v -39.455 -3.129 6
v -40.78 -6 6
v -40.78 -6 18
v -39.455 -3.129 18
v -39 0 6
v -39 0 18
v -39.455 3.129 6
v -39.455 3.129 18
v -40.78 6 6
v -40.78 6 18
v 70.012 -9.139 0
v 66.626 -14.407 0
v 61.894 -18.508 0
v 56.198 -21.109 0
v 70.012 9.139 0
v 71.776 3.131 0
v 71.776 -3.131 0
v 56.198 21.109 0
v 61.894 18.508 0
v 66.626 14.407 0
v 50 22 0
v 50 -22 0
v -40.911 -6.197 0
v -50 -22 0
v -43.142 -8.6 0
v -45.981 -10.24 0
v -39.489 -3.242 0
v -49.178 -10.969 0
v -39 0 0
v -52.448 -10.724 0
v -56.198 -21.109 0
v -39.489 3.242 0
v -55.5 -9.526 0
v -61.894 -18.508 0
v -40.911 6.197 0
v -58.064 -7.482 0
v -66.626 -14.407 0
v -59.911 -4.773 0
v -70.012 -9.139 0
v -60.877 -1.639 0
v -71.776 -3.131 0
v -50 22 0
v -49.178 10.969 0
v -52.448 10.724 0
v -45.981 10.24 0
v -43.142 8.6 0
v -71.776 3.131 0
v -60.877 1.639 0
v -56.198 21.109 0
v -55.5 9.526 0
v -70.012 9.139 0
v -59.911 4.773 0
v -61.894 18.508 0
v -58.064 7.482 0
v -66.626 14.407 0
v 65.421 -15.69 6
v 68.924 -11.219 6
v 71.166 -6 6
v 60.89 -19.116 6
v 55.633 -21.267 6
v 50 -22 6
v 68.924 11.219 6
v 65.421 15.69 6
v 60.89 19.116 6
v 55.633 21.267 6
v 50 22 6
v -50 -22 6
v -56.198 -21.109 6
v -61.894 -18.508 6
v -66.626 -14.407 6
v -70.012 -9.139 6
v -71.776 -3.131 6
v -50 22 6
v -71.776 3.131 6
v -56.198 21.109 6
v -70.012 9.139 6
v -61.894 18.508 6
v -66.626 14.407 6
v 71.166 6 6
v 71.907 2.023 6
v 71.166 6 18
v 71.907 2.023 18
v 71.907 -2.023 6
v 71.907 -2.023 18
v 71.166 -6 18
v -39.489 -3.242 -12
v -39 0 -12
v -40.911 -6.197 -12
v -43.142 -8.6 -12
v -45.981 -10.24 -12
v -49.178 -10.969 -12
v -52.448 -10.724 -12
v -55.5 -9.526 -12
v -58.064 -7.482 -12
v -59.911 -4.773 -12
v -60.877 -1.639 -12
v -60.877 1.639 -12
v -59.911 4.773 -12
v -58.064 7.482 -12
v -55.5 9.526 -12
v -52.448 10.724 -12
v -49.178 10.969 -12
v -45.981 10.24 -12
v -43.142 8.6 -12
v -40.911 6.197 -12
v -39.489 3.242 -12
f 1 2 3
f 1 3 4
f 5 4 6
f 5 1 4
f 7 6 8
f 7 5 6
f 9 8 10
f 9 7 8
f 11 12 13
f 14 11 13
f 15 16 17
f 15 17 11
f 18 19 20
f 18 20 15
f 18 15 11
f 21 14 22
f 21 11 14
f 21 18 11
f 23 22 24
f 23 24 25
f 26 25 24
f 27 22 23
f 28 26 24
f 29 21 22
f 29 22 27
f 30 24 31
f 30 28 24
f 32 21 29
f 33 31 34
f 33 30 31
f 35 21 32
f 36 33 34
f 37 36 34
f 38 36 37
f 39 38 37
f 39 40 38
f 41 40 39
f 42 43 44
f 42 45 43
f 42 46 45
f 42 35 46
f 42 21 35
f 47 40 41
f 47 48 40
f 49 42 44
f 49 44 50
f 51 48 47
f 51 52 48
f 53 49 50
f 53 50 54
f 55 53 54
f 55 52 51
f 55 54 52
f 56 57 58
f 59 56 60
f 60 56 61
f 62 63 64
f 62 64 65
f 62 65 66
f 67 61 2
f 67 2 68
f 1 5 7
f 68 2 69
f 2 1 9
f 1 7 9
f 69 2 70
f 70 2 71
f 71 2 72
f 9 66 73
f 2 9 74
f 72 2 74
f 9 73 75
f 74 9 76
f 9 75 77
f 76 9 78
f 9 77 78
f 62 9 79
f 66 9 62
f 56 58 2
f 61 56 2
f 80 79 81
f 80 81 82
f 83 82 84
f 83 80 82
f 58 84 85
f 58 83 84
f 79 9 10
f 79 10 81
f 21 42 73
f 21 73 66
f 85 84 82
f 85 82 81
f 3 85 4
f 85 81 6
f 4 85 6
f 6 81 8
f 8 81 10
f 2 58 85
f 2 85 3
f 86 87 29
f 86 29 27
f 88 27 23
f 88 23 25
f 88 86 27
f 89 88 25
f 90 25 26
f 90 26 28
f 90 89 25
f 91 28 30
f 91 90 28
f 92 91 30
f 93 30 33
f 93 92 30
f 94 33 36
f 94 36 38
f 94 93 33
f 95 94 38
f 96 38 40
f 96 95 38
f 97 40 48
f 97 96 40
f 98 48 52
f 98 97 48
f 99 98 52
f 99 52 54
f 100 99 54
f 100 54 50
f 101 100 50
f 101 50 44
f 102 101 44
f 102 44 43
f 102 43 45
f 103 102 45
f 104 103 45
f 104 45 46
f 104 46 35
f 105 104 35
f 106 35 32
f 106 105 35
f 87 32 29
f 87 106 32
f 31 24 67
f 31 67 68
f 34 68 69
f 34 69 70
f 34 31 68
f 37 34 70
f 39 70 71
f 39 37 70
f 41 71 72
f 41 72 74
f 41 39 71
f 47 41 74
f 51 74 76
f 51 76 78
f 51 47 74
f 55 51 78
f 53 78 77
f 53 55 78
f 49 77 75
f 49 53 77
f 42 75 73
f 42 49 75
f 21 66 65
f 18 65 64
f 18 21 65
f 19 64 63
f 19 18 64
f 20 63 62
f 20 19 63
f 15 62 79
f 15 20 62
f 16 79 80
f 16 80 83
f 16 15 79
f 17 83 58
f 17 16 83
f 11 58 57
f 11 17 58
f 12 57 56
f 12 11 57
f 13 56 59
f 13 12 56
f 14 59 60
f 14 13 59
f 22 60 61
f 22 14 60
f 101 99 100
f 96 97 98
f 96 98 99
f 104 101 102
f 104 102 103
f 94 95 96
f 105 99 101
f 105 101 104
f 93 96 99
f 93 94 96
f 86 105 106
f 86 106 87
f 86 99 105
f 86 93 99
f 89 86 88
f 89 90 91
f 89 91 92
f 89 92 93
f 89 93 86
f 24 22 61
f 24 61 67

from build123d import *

# Parameters (mm, degrees)
BOSS_EXTRUDE4_DEPTH = 6
BOSS_EXTRUDE6_DEPTH = 12
BOSS_EXTRUDE7_START = 12
SKETCH7_R           = 11
BOSS_EXTRUDE7_DEPTH = 12


with BuildPart() as part:
    # Sketch2 → Boss-Extrude4 (new body)
    with BuildSketch(Plane.XY):
        with BuildLine():
            Line((-50, 22), (50, 22))
            ThreePointArc((50, 22), (72, 0), (50, -22))
            Line((50, -22), (-50, -22))
            ThreePointArc((-50, -22), (-72, 0), (-50, 22))
        make_face()
    extrude(amount=BOSS_EXTRUDE4_DEPTH)

    # Sketch5 → Boss-Extrude6 (add)
    with BuildSketch(Plane.XY.offset(6)):
        with BuildLine():
            Line((-40.780455543, 6), (71.166010489, 6))
            ThreePointArc((71.166010489, 6), (72, 0), (71.166010489, -6))
            Line((71.166010489, -6), (-40.780455543, -6))
            ThreePointArc((-40.780455543, -6), (-39, 0), (-40.780455543, 6))
        make_face()
    extrude(amount=BOSS_EXTRUDE6_DEPTH)

    # Sketch7 → Boss-Extrude7 (add)
    with BuildSketch(Plane(origin=(0, 0, 0), x_dir=(-1, 0, 0), z_dir=(0, 0, -1)).offset(BOSS_EXTRUDE7_START)):
        with Locations(Location((50, 0, 0), (0, 0, 180))):
            Circle(SKETCH7_R)
    extrude(amount=-BOSS_EXTRUDE7_DEPTH)


solid = part.part
